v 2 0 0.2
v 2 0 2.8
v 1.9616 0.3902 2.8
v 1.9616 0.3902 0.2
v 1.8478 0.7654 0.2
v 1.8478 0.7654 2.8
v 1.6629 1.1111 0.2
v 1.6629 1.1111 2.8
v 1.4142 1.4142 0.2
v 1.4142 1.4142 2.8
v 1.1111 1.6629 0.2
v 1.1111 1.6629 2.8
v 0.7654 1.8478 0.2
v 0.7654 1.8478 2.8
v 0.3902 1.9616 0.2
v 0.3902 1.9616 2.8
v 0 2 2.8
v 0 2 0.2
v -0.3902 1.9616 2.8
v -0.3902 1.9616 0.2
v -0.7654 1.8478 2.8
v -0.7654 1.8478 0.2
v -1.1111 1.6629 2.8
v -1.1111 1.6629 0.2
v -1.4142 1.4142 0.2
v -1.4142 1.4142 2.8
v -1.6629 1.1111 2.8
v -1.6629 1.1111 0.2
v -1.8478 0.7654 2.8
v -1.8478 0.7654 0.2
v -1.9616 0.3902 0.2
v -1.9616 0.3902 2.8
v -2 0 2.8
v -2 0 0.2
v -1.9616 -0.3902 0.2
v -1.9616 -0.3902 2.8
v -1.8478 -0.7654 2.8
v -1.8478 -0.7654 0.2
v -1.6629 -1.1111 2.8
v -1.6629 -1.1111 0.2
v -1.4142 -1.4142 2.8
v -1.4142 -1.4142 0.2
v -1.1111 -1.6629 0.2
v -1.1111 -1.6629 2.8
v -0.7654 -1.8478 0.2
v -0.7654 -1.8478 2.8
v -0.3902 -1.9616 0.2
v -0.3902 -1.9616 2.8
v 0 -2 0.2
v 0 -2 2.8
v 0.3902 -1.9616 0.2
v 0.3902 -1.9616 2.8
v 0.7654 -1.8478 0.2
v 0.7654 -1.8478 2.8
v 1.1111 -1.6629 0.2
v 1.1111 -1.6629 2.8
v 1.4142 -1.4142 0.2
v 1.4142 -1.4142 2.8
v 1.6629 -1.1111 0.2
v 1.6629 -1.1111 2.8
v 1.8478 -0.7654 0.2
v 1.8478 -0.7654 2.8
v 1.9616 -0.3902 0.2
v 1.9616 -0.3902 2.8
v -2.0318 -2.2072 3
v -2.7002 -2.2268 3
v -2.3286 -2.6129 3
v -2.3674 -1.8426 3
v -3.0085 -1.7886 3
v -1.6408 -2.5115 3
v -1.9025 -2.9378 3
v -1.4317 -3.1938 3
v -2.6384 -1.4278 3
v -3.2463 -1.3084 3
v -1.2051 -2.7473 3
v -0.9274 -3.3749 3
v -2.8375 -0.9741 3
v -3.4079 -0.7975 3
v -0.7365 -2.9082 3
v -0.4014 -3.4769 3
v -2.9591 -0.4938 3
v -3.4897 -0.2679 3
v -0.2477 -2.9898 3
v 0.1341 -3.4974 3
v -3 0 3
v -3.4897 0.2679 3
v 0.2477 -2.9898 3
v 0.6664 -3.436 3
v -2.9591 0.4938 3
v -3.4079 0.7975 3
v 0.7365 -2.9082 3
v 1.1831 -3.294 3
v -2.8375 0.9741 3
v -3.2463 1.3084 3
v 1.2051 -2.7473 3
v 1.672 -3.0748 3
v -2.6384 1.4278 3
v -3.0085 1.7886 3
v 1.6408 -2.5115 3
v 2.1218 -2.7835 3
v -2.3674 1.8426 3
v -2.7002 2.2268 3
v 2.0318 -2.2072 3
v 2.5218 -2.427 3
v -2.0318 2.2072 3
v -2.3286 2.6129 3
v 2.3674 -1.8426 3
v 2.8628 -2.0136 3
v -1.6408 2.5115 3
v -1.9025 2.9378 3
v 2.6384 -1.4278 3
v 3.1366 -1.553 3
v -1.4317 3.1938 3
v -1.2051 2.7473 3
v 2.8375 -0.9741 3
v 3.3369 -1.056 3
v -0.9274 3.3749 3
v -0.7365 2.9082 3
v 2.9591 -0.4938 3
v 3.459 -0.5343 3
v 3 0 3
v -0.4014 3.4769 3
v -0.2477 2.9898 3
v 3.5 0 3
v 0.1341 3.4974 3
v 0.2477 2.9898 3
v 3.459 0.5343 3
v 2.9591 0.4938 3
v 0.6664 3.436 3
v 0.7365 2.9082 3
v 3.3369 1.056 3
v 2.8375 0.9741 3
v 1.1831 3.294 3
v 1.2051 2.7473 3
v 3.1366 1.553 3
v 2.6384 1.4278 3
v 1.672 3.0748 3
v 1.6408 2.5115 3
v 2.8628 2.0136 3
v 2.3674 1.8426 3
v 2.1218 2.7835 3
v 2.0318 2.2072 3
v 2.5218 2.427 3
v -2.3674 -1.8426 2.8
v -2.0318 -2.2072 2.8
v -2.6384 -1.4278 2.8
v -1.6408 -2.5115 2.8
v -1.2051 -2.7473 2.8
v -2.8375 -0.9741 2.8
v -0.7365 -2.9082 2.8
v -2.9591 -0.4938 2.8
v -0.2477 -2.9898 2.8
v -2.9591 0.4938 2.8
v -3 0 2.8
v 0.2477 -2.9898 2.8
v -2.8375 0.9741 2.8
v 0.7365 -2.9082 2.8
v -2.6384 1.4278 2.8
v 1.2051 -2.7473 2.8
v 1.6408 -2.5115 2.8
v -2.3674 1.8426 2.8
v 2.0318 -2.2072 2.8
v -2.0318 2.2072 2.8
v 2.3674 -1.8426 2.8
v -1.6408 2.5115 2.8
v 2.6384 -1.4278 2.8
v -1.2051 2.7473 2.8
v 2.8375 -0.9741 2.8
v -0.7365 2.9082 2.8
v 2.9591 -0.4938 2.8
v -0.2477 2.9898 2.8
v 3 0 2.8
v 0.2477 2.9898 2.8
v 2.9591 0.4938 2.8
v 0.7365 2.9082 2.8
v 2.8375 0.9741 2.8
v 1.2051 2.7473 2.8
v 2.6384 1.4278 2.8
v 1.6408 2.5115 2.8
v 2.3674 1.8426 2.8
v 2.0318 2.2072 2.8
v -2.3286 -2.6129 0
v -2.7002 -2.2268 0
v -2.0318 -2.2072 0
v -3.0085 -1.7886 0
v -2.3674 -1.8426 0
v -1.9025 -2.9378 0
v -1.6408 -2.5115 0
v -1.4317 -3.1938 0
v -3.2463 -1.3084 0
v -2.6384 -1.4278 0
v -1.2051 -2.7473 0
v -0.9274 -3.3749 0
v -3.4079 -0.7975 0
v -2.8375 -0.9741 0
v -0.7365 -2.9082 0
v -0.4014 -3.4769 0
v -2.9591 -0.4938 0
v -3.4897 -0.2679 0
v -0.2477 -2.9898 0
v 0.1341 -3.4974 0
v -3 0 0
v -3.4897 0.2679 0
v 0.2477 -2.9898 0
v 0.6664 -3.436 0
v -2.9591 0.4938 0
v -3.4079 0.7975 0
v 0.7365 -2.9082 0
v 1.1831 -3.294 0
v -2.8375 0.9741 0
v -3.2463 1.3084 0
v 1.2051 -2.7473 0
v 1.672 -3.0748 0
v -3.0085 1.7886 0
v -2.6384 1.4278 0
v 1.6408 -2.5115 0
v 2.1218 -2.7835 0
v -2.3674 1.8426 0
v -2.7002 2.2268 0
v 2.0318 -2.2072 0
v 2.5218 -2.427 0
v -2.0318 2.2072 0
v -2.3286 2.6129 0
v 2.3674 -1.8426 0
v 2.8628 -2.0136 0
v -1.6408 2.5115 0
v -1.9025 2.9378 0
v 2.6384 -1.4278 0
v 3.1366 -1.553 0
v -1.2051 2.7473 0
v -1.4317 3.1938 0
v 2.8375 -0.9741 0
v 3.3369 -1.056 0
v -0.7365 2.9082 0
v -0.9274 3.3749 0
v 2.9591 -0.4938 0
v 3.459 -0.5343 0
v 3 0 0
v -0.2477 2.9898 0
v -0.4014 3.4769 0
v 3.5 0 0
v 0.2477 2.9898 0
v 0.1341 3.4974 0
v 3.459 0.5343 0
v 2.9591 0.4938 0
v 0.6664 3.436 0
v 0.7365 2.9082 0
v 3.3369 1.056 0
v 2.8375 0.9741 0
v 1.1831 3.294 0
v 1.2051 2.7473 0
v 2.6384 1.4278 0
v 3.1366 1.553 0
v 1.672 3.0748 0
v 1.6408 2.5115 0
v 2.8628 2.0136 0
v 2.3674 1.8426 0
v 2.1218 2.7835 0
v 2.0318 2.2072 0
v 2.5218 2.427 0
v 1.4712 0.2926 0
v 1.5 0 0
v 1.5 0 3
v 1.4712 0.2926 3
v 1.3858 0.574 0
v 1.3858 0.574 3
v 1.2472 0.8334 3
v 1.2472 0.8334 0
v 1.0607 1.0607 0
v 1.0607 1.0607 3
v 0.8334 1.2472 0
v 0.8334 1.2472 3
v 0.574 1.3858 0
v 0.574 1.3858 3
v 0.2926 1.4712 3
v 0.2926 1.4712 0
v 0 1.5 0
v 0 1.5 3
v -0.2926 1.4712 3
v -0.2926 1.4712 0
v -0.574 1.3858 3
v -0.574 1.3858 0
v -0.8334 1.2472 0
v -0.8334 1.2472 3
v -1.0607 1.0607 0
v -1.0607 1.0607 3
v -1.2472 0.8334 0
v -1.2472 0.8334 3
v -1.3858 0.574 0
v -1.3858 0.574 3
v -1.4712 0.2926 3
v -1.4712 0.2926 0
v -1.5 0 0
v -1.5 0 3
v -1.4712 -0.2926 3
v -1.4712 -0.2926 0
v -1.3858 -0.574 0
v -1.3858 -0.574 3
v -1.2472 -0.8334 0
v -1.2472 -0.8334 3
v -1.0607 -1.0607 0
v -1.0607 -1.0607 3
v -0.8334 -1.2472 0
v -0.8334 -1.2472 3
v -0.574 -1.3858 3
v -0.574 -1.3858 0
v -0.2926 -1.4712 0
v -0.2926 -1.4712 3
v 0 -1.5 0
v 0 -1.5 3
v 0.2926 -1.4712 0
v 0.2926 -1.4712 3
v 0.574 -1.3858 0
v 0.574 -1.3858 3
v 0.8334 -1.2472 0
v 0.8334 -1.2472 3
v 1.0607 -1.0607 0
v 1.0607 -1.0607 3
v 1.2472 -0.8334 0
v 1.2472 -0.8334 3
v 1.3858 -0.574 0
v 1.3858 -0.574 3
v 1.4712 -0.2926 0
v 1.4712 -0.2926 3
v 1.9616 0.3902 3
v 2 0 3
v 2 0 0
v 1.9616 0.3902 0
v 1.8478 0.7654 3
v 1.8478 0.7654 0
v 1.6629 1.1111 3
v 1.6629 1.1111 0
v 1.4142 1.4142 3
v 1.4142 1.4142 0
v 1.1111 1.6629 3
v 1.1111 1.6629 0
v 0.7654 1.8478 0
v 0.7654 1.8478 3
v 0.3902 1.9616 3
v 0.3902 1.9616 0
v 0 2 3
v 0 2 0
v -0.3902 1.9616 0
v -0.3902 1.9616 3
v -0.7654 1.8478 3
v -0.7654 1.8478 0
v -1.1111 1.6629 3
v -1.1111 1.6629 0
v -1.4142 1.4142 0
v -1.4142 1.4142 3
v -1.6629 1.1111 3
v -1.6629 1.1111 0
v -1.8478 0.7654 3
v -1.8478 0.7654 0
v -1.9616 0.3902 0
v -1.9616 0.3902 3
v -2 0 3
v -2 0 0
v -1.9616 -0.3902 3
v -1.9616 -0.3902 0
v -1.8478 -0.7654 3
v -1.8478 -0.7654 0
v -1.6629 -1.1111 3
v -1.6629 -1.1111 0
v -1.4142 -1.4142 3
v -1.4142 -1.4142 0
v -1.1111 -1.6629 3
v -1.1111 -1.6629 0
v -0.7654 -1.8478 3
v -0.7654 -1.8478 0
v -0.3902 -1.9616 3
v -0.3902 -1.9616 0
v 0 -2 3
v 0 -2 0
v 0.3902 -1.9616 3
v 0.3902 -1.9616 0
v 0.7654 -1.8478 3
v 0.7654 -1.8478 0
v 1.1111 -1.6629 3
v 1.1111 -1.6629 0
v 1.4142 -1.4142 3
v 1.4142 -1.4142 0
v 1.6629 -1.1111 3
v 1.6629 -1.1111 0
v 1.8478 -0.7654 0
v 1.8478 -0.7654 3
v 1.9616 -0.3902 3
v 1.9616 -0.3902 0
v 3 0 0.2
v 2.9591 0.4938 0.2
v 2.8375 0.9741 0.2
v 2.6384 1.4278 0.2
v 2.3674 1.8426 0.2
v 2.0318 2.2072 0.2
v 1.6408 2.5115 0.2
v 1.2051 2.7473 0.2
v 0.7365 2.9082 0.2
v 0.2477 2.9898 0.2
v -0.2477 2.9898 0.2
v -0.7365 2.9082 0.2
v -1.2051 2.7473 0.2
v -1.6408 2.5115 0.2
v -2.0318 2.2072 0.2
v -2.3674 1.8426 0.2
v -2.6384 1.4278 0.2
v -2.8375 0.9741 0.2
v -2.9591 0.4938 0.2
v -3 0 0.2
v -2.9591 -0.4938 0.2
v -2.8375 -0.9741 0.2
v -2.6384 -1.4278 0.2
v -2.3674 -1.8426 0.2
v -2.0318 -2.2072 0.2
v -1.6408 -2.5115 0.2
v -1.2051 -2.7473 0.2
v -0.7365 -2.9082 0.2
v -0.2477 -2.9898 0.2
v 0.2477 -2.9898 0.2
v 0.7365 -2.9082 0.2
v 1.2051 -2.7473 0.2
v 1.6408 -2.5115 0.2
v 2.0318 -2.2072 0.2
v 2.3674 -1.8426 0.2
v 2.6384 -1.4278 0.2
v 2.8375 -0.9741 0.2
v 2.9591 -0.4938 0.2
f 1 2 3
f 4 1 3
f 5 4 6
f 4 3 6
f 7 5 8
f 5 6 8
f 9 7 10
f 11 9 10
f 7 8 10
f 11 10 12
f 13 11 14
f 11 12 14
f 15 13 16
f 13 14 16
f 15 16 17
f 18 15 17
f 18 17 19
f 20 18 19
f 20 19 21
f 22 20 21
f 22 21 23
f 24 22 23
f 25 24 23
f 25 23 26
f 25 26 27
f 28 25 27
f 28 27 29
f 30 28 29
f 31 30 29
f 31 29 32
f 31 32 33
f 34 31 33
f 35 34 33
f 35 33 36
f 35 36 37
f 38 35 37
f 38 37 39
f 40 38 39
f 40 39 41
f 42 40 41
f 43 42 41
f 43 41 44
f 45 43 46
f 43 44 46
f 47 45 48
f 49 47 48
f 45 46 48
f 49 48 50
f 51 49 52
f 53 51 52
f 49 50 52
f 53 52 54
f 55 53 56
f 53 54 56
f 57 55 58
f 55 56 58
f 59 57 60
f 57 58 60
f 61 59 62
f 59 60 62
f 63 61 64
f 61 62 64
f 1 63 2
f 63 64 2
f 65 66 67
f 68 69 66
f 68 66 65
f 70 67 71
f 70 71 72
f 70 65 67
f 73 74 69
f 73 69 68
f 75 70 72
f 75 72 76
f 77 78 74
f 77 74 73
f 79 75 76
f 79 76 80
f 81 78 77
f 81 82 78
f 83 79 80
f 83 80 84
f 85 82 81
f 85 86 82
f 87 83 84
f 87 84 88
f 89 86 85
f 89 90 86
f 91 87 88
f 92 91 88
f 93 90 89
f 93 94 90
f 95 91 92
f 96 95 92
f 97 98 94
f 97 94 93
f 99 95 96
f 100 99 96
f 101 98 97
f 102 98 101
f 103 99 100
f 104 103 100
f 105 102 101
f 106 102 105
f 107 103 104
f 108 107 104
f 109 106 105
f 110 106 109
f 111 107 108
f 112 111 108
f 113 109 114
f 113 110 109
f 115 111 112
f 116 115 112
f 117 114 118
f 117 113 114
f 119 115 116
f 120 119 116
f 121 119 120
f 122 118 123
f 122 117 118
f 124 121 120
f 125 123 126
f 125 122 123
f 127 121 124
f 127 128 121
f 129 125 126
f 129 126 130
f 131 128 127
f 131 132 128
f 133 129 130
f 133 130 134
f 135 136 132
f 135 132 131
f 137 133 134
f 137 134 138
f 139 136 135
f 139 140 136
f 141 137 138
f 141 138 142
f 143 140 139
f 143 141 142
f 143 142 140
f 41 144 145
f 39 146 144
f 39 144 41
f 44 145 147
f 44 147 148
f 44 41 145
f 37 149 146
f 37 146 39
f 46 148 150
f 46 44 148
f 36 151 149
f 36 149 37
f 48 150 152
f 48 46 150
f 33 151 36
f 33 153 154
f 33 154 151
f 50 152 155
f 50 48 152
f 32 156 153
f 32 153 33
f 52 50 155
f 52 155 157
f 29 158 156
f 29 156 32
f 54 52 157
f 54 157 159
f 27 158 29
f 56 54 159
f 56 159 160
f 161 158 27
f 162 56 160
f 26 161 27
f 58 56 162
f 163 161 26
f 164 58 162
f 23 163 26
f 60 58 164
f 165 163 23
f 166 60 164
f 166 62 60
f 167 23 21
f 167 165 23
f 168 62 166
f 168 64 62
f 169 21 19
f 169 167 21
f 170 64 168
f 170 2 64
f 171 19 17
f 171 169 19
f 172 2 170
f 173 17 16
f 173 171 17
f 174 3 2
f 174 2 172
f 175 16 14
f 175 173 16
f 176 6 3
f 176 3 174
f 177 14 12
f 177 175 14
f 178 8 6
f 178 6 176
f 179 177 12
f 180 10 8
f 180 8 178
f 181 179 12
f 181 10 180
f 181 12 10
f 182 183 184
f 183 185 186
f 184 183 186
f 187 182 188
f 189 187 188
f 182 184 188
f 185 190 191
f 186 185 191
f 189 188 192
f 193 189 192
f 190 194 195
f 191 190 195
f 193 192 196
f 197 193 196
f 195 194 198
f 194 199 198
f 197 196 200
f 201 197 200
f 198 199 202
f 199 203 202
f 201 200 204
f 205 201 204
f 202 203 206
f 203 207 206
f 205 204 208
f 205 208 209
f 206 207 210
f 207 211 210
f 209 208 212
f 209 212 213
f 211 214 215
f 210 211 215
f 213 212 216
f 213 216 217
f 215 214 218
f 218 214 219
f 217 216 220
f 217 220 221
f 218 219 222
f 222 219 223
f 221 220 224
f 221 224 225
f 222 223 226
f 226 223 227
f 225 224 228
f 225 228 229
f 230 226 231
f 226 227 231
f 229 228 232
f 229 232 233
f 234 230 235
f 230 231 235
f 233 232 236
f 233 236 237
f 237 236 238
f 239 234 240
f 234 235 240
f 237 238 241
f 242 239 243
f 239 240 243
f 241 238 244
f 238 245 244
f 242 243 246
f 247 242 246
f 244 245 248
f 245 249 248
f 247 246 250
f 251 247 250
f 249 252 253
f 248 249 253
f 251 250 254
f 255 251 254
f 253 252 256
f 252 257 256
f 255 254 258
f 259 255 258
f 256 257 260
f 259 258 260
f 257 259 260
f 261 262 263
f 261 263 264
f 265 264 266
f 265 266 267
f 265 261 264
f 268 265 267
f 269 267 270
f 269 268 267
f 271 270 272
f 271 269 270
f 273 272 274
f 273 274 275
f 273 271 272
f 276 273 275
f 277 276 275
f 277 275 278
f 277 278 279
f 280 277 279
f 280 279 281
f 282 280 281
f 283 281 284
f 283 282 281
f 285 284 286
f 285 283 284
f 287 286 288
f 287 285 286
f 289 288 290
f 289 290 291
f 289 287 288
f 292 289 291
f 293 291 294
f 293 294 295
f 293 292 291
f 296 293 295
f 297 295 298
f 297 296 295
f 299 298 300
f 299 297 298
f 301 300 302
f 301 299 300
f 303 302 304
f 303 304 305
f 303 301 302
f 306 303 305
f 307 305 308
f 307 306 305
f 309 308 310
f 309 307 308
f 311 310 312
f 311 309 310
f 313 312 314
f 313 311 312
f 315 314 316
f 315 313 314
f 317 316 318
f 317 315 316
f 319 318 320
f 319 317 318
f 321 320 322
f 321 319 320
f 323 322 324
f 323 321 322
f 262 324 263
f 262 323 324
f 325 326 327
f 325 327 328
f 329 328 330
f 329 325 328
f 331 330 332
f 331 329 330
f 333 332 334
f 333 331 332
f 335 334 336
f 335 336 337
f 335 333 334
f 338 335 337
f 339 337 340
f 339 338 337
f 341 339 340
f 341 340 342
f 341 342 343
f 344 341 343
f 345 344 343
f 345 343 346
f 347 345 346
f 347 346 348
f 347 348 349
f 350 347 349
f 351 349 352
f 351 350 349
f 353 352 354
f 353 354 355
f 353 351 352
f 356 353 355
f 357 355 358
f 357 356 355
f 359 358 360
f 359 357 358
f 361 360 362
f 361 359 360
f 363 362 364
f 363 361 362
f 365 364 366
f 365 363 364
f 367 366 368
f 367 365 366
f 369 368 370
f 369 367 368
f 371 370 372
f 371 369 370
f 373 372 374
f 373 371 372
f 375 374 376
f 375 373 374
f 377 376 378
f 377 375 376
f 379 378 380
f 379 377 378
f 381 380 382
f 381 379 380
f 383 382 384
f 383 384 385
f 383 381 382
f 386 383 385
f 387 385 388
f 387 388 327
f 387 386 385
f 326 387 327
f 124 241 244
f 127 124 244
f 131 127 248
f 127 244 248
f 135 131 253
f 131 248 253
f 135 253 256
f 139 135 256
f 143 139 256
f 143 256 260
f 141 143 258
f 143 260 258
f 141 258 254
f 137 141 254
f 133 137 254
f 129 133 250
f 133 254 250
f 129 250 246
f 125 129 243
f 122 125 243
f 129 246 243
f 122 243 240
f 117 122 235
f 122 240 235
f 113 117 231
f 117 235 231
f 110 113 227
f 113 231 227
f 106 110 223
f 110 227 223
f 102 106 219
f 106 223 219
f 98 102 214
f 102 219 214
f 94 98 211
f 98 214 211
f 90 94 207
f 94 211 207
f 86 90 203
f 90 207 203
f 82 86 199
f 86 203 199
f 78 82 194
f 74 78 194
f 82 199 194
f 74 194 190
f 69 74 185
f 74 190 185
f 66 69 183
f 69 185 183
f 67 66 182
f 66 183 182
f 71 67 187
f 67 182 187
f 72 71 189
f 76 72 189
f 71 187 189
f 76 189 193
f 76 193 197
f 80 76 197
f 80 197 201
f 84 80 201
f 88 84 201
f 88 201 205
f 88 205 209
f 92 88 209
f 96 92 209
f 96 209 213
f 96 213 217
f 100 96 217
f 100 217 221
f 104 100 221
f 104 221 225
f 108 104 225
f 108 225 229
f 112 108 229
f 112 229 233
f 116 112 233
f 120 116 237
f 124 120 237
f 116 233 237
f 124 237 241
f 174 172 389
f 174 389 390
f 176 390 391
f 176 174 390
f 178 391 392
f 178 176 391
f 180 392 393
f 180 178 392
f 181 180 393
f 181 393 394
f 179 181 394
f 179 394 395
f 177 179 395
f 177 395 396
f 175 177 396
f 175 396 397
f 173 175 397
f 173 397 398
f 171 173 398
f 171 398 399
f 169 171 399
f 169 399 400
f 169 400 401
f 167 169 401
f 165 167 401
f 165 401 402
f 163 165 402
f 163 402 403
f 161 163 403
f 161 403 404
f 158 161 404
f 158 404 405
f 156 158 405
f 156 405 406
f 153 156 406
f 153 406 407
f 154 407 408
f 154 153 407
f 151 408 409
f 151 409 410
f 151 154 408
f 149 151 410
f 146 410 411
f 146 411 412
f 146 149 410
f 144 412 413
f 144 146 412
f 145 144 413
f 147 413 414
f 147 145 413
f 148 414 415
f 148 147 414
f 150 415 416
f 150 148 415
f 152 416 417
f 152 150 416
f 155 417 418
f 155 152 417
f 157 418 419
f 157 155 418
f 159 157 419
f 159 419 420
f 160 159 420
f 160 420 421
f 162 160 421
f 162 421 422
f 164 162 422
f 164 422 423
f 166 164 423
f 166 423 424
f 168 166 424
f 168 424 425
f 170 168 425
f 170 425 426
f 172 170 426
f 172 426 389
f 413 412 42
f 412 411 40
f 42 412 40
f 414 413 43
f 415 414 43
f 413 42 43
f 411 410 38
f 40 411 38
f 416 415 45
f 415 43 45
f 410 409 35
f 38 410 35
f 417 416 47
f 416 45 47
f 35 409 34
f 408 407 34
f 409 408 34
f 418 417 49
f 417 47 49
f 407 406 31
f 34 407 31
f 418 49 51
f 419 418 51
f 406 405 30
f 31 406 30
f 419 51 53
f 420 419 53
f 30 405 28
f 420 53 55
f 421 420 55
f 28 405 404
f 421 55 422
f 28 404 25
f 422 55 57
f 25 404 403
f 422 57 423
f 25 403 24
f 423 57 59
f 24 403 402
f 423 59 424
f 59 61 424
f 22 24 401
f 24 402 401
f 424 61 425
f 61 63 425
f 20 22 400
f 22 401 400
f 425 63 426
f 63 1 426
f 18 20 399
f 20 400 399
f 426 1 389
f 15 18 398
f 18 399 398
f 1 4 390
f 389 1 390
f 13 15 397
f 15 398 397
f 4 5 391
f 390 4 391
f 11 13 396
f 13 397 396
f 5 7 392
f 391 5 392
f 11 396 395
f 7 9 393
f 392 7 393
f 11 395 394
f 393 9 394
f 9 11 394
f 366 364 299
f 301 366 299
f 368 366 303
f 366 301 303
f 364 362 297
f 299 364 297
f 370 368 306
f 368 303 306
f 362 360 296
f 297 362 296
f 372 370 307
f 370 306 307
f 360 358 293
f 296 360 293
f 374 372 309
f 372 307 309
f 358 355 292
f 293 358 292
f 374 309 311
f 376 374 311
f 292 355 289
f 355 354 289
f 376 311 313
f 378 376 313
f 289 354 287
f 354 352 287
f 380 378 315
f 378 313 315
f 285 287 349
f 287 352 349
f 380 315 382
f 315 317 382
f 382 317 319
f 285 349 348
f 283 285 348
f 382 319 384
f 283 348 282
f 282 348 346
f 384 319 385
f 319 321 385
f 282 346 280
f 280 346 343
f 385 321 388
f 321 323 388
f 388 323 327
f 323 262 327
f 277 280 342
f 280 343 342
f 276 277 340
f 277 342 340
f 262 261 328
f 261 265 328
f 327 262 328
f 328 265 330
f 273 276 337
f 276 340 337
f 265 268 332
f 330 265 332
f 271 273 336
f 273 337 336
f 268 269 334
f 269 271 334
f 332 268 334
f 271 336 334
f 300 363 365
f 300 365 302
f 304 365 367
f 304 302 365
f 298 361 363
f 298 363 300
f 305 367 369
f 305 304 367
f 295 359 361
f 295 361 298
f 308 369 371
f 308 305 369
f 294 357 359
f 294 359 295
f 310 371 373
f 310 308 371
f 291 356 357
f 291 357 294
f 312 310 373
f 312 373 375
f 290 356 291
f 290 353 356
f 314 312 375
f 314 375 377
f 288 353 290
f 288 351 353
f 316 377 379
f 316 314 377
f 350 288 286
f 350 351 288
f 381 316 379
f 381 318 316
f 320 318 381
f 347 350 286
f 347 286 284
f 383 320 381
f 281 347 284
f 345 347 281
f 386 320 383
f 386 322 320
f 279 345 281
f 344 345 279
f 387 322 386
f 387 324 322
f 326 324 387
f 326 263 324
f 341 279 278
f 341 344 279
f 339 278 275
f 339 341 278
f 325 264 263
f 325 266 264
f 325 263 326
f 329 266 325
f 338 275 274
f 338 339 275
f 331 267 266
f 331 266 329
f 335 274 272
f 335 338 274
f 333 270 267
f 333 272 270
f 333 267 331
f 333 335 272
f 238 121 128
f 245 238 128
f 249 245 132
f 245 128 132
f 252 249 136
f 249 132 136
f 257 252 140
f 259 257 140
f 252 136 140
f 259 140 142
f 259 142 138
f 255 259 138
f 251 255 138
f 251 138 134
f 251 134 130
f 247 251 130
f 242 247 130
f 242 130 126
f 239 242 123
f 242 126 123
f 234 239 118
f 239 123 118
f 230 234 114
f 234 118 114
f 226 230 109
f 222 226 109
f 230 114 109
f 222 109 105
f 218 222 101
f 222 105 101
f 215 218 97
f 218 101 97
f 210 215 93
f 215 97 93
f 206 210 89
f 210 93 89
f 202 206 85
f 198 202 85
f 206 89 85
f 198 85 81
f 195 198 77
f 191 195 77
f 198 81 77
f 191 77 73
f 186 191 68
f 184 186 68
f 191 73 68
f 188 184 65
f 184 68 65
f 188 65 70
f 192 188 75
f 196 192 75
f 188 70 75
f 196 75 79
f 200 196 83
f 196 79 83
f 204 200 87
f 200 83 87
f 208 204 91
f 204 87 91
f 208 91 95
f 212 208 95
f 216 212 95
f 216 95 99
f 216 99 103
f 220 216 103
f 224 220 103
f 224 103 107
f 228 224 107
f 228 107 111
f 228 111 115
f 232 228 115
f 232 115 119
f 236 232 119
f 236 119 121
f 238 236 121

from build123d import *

# Parameters (mm, degrees)
SKETCH1_R           = 3.5
SKETCH1_R_2         = 1.5
BOSS_EXTRUDE1_DEPTH = 3
SKETCH2_R           = 3
SKETCH2_R_2         = 2
CUT_EXTRUDE1_DEPTH  = 3
SKETCH3_R           = 3
SKETCH3_R_2         = 2
BOSS_EXTRUDE3_DEPTH = 2.8
SKETCH4_R           = 3
SKETCH4_R_2         = 2
CUT_EXTRUDE2_DEPTH  = 0.2


with BuildPart() as part:
    # Sketch1 → Boss-Extrude1 (new body)
    with BuildSketch(Plane.XY):
        Circle(SKETCH1_R)
        Circle(SKETCH1_R_2, mode=Mode.SUBTRACT)
    extrude(amount=BOSS_EXTRUDE1_DEPTH)

    # Sketch2 → Cut-Extrude1 (cut)
    with BuildSketch(Plane.XY.offset(3)):
        Circle(SKETCH2_R)
        Circle(SKETCH2_R_2, mode=Mode.SUBTRACT)
    extrude(amount=-CUT_EXTRUDE1_DEPTH, mode=Mode.SUBTRACT)


with BuildPart() as body_2:
    # Sketch3 → Boss-Extrude3 (new body)
    with BuildSketch(Plane.XY.offset(3)):
        Circle(SKETCH3_R)
        Circle(SKETCH3_R_2, mode=Mode.SUBTRACT)
    extrude(amount=-BOSS_EXTRUDE3_DEPTH)

    # Sketch4 → Cut-Extrude2 (cut)
    with BuildSketch(Plane.XY.offset(3)):
        Circle(SKETCH4_R)
        Circle(SKETCH4_R_2, mode=Mode.SUBTRACT)
    extrude(amount=-CUT_EXTRUDE2_DEPTH, mode=Mode.SUBTRACT)


solid = Compound([part.part, body_2.part])
